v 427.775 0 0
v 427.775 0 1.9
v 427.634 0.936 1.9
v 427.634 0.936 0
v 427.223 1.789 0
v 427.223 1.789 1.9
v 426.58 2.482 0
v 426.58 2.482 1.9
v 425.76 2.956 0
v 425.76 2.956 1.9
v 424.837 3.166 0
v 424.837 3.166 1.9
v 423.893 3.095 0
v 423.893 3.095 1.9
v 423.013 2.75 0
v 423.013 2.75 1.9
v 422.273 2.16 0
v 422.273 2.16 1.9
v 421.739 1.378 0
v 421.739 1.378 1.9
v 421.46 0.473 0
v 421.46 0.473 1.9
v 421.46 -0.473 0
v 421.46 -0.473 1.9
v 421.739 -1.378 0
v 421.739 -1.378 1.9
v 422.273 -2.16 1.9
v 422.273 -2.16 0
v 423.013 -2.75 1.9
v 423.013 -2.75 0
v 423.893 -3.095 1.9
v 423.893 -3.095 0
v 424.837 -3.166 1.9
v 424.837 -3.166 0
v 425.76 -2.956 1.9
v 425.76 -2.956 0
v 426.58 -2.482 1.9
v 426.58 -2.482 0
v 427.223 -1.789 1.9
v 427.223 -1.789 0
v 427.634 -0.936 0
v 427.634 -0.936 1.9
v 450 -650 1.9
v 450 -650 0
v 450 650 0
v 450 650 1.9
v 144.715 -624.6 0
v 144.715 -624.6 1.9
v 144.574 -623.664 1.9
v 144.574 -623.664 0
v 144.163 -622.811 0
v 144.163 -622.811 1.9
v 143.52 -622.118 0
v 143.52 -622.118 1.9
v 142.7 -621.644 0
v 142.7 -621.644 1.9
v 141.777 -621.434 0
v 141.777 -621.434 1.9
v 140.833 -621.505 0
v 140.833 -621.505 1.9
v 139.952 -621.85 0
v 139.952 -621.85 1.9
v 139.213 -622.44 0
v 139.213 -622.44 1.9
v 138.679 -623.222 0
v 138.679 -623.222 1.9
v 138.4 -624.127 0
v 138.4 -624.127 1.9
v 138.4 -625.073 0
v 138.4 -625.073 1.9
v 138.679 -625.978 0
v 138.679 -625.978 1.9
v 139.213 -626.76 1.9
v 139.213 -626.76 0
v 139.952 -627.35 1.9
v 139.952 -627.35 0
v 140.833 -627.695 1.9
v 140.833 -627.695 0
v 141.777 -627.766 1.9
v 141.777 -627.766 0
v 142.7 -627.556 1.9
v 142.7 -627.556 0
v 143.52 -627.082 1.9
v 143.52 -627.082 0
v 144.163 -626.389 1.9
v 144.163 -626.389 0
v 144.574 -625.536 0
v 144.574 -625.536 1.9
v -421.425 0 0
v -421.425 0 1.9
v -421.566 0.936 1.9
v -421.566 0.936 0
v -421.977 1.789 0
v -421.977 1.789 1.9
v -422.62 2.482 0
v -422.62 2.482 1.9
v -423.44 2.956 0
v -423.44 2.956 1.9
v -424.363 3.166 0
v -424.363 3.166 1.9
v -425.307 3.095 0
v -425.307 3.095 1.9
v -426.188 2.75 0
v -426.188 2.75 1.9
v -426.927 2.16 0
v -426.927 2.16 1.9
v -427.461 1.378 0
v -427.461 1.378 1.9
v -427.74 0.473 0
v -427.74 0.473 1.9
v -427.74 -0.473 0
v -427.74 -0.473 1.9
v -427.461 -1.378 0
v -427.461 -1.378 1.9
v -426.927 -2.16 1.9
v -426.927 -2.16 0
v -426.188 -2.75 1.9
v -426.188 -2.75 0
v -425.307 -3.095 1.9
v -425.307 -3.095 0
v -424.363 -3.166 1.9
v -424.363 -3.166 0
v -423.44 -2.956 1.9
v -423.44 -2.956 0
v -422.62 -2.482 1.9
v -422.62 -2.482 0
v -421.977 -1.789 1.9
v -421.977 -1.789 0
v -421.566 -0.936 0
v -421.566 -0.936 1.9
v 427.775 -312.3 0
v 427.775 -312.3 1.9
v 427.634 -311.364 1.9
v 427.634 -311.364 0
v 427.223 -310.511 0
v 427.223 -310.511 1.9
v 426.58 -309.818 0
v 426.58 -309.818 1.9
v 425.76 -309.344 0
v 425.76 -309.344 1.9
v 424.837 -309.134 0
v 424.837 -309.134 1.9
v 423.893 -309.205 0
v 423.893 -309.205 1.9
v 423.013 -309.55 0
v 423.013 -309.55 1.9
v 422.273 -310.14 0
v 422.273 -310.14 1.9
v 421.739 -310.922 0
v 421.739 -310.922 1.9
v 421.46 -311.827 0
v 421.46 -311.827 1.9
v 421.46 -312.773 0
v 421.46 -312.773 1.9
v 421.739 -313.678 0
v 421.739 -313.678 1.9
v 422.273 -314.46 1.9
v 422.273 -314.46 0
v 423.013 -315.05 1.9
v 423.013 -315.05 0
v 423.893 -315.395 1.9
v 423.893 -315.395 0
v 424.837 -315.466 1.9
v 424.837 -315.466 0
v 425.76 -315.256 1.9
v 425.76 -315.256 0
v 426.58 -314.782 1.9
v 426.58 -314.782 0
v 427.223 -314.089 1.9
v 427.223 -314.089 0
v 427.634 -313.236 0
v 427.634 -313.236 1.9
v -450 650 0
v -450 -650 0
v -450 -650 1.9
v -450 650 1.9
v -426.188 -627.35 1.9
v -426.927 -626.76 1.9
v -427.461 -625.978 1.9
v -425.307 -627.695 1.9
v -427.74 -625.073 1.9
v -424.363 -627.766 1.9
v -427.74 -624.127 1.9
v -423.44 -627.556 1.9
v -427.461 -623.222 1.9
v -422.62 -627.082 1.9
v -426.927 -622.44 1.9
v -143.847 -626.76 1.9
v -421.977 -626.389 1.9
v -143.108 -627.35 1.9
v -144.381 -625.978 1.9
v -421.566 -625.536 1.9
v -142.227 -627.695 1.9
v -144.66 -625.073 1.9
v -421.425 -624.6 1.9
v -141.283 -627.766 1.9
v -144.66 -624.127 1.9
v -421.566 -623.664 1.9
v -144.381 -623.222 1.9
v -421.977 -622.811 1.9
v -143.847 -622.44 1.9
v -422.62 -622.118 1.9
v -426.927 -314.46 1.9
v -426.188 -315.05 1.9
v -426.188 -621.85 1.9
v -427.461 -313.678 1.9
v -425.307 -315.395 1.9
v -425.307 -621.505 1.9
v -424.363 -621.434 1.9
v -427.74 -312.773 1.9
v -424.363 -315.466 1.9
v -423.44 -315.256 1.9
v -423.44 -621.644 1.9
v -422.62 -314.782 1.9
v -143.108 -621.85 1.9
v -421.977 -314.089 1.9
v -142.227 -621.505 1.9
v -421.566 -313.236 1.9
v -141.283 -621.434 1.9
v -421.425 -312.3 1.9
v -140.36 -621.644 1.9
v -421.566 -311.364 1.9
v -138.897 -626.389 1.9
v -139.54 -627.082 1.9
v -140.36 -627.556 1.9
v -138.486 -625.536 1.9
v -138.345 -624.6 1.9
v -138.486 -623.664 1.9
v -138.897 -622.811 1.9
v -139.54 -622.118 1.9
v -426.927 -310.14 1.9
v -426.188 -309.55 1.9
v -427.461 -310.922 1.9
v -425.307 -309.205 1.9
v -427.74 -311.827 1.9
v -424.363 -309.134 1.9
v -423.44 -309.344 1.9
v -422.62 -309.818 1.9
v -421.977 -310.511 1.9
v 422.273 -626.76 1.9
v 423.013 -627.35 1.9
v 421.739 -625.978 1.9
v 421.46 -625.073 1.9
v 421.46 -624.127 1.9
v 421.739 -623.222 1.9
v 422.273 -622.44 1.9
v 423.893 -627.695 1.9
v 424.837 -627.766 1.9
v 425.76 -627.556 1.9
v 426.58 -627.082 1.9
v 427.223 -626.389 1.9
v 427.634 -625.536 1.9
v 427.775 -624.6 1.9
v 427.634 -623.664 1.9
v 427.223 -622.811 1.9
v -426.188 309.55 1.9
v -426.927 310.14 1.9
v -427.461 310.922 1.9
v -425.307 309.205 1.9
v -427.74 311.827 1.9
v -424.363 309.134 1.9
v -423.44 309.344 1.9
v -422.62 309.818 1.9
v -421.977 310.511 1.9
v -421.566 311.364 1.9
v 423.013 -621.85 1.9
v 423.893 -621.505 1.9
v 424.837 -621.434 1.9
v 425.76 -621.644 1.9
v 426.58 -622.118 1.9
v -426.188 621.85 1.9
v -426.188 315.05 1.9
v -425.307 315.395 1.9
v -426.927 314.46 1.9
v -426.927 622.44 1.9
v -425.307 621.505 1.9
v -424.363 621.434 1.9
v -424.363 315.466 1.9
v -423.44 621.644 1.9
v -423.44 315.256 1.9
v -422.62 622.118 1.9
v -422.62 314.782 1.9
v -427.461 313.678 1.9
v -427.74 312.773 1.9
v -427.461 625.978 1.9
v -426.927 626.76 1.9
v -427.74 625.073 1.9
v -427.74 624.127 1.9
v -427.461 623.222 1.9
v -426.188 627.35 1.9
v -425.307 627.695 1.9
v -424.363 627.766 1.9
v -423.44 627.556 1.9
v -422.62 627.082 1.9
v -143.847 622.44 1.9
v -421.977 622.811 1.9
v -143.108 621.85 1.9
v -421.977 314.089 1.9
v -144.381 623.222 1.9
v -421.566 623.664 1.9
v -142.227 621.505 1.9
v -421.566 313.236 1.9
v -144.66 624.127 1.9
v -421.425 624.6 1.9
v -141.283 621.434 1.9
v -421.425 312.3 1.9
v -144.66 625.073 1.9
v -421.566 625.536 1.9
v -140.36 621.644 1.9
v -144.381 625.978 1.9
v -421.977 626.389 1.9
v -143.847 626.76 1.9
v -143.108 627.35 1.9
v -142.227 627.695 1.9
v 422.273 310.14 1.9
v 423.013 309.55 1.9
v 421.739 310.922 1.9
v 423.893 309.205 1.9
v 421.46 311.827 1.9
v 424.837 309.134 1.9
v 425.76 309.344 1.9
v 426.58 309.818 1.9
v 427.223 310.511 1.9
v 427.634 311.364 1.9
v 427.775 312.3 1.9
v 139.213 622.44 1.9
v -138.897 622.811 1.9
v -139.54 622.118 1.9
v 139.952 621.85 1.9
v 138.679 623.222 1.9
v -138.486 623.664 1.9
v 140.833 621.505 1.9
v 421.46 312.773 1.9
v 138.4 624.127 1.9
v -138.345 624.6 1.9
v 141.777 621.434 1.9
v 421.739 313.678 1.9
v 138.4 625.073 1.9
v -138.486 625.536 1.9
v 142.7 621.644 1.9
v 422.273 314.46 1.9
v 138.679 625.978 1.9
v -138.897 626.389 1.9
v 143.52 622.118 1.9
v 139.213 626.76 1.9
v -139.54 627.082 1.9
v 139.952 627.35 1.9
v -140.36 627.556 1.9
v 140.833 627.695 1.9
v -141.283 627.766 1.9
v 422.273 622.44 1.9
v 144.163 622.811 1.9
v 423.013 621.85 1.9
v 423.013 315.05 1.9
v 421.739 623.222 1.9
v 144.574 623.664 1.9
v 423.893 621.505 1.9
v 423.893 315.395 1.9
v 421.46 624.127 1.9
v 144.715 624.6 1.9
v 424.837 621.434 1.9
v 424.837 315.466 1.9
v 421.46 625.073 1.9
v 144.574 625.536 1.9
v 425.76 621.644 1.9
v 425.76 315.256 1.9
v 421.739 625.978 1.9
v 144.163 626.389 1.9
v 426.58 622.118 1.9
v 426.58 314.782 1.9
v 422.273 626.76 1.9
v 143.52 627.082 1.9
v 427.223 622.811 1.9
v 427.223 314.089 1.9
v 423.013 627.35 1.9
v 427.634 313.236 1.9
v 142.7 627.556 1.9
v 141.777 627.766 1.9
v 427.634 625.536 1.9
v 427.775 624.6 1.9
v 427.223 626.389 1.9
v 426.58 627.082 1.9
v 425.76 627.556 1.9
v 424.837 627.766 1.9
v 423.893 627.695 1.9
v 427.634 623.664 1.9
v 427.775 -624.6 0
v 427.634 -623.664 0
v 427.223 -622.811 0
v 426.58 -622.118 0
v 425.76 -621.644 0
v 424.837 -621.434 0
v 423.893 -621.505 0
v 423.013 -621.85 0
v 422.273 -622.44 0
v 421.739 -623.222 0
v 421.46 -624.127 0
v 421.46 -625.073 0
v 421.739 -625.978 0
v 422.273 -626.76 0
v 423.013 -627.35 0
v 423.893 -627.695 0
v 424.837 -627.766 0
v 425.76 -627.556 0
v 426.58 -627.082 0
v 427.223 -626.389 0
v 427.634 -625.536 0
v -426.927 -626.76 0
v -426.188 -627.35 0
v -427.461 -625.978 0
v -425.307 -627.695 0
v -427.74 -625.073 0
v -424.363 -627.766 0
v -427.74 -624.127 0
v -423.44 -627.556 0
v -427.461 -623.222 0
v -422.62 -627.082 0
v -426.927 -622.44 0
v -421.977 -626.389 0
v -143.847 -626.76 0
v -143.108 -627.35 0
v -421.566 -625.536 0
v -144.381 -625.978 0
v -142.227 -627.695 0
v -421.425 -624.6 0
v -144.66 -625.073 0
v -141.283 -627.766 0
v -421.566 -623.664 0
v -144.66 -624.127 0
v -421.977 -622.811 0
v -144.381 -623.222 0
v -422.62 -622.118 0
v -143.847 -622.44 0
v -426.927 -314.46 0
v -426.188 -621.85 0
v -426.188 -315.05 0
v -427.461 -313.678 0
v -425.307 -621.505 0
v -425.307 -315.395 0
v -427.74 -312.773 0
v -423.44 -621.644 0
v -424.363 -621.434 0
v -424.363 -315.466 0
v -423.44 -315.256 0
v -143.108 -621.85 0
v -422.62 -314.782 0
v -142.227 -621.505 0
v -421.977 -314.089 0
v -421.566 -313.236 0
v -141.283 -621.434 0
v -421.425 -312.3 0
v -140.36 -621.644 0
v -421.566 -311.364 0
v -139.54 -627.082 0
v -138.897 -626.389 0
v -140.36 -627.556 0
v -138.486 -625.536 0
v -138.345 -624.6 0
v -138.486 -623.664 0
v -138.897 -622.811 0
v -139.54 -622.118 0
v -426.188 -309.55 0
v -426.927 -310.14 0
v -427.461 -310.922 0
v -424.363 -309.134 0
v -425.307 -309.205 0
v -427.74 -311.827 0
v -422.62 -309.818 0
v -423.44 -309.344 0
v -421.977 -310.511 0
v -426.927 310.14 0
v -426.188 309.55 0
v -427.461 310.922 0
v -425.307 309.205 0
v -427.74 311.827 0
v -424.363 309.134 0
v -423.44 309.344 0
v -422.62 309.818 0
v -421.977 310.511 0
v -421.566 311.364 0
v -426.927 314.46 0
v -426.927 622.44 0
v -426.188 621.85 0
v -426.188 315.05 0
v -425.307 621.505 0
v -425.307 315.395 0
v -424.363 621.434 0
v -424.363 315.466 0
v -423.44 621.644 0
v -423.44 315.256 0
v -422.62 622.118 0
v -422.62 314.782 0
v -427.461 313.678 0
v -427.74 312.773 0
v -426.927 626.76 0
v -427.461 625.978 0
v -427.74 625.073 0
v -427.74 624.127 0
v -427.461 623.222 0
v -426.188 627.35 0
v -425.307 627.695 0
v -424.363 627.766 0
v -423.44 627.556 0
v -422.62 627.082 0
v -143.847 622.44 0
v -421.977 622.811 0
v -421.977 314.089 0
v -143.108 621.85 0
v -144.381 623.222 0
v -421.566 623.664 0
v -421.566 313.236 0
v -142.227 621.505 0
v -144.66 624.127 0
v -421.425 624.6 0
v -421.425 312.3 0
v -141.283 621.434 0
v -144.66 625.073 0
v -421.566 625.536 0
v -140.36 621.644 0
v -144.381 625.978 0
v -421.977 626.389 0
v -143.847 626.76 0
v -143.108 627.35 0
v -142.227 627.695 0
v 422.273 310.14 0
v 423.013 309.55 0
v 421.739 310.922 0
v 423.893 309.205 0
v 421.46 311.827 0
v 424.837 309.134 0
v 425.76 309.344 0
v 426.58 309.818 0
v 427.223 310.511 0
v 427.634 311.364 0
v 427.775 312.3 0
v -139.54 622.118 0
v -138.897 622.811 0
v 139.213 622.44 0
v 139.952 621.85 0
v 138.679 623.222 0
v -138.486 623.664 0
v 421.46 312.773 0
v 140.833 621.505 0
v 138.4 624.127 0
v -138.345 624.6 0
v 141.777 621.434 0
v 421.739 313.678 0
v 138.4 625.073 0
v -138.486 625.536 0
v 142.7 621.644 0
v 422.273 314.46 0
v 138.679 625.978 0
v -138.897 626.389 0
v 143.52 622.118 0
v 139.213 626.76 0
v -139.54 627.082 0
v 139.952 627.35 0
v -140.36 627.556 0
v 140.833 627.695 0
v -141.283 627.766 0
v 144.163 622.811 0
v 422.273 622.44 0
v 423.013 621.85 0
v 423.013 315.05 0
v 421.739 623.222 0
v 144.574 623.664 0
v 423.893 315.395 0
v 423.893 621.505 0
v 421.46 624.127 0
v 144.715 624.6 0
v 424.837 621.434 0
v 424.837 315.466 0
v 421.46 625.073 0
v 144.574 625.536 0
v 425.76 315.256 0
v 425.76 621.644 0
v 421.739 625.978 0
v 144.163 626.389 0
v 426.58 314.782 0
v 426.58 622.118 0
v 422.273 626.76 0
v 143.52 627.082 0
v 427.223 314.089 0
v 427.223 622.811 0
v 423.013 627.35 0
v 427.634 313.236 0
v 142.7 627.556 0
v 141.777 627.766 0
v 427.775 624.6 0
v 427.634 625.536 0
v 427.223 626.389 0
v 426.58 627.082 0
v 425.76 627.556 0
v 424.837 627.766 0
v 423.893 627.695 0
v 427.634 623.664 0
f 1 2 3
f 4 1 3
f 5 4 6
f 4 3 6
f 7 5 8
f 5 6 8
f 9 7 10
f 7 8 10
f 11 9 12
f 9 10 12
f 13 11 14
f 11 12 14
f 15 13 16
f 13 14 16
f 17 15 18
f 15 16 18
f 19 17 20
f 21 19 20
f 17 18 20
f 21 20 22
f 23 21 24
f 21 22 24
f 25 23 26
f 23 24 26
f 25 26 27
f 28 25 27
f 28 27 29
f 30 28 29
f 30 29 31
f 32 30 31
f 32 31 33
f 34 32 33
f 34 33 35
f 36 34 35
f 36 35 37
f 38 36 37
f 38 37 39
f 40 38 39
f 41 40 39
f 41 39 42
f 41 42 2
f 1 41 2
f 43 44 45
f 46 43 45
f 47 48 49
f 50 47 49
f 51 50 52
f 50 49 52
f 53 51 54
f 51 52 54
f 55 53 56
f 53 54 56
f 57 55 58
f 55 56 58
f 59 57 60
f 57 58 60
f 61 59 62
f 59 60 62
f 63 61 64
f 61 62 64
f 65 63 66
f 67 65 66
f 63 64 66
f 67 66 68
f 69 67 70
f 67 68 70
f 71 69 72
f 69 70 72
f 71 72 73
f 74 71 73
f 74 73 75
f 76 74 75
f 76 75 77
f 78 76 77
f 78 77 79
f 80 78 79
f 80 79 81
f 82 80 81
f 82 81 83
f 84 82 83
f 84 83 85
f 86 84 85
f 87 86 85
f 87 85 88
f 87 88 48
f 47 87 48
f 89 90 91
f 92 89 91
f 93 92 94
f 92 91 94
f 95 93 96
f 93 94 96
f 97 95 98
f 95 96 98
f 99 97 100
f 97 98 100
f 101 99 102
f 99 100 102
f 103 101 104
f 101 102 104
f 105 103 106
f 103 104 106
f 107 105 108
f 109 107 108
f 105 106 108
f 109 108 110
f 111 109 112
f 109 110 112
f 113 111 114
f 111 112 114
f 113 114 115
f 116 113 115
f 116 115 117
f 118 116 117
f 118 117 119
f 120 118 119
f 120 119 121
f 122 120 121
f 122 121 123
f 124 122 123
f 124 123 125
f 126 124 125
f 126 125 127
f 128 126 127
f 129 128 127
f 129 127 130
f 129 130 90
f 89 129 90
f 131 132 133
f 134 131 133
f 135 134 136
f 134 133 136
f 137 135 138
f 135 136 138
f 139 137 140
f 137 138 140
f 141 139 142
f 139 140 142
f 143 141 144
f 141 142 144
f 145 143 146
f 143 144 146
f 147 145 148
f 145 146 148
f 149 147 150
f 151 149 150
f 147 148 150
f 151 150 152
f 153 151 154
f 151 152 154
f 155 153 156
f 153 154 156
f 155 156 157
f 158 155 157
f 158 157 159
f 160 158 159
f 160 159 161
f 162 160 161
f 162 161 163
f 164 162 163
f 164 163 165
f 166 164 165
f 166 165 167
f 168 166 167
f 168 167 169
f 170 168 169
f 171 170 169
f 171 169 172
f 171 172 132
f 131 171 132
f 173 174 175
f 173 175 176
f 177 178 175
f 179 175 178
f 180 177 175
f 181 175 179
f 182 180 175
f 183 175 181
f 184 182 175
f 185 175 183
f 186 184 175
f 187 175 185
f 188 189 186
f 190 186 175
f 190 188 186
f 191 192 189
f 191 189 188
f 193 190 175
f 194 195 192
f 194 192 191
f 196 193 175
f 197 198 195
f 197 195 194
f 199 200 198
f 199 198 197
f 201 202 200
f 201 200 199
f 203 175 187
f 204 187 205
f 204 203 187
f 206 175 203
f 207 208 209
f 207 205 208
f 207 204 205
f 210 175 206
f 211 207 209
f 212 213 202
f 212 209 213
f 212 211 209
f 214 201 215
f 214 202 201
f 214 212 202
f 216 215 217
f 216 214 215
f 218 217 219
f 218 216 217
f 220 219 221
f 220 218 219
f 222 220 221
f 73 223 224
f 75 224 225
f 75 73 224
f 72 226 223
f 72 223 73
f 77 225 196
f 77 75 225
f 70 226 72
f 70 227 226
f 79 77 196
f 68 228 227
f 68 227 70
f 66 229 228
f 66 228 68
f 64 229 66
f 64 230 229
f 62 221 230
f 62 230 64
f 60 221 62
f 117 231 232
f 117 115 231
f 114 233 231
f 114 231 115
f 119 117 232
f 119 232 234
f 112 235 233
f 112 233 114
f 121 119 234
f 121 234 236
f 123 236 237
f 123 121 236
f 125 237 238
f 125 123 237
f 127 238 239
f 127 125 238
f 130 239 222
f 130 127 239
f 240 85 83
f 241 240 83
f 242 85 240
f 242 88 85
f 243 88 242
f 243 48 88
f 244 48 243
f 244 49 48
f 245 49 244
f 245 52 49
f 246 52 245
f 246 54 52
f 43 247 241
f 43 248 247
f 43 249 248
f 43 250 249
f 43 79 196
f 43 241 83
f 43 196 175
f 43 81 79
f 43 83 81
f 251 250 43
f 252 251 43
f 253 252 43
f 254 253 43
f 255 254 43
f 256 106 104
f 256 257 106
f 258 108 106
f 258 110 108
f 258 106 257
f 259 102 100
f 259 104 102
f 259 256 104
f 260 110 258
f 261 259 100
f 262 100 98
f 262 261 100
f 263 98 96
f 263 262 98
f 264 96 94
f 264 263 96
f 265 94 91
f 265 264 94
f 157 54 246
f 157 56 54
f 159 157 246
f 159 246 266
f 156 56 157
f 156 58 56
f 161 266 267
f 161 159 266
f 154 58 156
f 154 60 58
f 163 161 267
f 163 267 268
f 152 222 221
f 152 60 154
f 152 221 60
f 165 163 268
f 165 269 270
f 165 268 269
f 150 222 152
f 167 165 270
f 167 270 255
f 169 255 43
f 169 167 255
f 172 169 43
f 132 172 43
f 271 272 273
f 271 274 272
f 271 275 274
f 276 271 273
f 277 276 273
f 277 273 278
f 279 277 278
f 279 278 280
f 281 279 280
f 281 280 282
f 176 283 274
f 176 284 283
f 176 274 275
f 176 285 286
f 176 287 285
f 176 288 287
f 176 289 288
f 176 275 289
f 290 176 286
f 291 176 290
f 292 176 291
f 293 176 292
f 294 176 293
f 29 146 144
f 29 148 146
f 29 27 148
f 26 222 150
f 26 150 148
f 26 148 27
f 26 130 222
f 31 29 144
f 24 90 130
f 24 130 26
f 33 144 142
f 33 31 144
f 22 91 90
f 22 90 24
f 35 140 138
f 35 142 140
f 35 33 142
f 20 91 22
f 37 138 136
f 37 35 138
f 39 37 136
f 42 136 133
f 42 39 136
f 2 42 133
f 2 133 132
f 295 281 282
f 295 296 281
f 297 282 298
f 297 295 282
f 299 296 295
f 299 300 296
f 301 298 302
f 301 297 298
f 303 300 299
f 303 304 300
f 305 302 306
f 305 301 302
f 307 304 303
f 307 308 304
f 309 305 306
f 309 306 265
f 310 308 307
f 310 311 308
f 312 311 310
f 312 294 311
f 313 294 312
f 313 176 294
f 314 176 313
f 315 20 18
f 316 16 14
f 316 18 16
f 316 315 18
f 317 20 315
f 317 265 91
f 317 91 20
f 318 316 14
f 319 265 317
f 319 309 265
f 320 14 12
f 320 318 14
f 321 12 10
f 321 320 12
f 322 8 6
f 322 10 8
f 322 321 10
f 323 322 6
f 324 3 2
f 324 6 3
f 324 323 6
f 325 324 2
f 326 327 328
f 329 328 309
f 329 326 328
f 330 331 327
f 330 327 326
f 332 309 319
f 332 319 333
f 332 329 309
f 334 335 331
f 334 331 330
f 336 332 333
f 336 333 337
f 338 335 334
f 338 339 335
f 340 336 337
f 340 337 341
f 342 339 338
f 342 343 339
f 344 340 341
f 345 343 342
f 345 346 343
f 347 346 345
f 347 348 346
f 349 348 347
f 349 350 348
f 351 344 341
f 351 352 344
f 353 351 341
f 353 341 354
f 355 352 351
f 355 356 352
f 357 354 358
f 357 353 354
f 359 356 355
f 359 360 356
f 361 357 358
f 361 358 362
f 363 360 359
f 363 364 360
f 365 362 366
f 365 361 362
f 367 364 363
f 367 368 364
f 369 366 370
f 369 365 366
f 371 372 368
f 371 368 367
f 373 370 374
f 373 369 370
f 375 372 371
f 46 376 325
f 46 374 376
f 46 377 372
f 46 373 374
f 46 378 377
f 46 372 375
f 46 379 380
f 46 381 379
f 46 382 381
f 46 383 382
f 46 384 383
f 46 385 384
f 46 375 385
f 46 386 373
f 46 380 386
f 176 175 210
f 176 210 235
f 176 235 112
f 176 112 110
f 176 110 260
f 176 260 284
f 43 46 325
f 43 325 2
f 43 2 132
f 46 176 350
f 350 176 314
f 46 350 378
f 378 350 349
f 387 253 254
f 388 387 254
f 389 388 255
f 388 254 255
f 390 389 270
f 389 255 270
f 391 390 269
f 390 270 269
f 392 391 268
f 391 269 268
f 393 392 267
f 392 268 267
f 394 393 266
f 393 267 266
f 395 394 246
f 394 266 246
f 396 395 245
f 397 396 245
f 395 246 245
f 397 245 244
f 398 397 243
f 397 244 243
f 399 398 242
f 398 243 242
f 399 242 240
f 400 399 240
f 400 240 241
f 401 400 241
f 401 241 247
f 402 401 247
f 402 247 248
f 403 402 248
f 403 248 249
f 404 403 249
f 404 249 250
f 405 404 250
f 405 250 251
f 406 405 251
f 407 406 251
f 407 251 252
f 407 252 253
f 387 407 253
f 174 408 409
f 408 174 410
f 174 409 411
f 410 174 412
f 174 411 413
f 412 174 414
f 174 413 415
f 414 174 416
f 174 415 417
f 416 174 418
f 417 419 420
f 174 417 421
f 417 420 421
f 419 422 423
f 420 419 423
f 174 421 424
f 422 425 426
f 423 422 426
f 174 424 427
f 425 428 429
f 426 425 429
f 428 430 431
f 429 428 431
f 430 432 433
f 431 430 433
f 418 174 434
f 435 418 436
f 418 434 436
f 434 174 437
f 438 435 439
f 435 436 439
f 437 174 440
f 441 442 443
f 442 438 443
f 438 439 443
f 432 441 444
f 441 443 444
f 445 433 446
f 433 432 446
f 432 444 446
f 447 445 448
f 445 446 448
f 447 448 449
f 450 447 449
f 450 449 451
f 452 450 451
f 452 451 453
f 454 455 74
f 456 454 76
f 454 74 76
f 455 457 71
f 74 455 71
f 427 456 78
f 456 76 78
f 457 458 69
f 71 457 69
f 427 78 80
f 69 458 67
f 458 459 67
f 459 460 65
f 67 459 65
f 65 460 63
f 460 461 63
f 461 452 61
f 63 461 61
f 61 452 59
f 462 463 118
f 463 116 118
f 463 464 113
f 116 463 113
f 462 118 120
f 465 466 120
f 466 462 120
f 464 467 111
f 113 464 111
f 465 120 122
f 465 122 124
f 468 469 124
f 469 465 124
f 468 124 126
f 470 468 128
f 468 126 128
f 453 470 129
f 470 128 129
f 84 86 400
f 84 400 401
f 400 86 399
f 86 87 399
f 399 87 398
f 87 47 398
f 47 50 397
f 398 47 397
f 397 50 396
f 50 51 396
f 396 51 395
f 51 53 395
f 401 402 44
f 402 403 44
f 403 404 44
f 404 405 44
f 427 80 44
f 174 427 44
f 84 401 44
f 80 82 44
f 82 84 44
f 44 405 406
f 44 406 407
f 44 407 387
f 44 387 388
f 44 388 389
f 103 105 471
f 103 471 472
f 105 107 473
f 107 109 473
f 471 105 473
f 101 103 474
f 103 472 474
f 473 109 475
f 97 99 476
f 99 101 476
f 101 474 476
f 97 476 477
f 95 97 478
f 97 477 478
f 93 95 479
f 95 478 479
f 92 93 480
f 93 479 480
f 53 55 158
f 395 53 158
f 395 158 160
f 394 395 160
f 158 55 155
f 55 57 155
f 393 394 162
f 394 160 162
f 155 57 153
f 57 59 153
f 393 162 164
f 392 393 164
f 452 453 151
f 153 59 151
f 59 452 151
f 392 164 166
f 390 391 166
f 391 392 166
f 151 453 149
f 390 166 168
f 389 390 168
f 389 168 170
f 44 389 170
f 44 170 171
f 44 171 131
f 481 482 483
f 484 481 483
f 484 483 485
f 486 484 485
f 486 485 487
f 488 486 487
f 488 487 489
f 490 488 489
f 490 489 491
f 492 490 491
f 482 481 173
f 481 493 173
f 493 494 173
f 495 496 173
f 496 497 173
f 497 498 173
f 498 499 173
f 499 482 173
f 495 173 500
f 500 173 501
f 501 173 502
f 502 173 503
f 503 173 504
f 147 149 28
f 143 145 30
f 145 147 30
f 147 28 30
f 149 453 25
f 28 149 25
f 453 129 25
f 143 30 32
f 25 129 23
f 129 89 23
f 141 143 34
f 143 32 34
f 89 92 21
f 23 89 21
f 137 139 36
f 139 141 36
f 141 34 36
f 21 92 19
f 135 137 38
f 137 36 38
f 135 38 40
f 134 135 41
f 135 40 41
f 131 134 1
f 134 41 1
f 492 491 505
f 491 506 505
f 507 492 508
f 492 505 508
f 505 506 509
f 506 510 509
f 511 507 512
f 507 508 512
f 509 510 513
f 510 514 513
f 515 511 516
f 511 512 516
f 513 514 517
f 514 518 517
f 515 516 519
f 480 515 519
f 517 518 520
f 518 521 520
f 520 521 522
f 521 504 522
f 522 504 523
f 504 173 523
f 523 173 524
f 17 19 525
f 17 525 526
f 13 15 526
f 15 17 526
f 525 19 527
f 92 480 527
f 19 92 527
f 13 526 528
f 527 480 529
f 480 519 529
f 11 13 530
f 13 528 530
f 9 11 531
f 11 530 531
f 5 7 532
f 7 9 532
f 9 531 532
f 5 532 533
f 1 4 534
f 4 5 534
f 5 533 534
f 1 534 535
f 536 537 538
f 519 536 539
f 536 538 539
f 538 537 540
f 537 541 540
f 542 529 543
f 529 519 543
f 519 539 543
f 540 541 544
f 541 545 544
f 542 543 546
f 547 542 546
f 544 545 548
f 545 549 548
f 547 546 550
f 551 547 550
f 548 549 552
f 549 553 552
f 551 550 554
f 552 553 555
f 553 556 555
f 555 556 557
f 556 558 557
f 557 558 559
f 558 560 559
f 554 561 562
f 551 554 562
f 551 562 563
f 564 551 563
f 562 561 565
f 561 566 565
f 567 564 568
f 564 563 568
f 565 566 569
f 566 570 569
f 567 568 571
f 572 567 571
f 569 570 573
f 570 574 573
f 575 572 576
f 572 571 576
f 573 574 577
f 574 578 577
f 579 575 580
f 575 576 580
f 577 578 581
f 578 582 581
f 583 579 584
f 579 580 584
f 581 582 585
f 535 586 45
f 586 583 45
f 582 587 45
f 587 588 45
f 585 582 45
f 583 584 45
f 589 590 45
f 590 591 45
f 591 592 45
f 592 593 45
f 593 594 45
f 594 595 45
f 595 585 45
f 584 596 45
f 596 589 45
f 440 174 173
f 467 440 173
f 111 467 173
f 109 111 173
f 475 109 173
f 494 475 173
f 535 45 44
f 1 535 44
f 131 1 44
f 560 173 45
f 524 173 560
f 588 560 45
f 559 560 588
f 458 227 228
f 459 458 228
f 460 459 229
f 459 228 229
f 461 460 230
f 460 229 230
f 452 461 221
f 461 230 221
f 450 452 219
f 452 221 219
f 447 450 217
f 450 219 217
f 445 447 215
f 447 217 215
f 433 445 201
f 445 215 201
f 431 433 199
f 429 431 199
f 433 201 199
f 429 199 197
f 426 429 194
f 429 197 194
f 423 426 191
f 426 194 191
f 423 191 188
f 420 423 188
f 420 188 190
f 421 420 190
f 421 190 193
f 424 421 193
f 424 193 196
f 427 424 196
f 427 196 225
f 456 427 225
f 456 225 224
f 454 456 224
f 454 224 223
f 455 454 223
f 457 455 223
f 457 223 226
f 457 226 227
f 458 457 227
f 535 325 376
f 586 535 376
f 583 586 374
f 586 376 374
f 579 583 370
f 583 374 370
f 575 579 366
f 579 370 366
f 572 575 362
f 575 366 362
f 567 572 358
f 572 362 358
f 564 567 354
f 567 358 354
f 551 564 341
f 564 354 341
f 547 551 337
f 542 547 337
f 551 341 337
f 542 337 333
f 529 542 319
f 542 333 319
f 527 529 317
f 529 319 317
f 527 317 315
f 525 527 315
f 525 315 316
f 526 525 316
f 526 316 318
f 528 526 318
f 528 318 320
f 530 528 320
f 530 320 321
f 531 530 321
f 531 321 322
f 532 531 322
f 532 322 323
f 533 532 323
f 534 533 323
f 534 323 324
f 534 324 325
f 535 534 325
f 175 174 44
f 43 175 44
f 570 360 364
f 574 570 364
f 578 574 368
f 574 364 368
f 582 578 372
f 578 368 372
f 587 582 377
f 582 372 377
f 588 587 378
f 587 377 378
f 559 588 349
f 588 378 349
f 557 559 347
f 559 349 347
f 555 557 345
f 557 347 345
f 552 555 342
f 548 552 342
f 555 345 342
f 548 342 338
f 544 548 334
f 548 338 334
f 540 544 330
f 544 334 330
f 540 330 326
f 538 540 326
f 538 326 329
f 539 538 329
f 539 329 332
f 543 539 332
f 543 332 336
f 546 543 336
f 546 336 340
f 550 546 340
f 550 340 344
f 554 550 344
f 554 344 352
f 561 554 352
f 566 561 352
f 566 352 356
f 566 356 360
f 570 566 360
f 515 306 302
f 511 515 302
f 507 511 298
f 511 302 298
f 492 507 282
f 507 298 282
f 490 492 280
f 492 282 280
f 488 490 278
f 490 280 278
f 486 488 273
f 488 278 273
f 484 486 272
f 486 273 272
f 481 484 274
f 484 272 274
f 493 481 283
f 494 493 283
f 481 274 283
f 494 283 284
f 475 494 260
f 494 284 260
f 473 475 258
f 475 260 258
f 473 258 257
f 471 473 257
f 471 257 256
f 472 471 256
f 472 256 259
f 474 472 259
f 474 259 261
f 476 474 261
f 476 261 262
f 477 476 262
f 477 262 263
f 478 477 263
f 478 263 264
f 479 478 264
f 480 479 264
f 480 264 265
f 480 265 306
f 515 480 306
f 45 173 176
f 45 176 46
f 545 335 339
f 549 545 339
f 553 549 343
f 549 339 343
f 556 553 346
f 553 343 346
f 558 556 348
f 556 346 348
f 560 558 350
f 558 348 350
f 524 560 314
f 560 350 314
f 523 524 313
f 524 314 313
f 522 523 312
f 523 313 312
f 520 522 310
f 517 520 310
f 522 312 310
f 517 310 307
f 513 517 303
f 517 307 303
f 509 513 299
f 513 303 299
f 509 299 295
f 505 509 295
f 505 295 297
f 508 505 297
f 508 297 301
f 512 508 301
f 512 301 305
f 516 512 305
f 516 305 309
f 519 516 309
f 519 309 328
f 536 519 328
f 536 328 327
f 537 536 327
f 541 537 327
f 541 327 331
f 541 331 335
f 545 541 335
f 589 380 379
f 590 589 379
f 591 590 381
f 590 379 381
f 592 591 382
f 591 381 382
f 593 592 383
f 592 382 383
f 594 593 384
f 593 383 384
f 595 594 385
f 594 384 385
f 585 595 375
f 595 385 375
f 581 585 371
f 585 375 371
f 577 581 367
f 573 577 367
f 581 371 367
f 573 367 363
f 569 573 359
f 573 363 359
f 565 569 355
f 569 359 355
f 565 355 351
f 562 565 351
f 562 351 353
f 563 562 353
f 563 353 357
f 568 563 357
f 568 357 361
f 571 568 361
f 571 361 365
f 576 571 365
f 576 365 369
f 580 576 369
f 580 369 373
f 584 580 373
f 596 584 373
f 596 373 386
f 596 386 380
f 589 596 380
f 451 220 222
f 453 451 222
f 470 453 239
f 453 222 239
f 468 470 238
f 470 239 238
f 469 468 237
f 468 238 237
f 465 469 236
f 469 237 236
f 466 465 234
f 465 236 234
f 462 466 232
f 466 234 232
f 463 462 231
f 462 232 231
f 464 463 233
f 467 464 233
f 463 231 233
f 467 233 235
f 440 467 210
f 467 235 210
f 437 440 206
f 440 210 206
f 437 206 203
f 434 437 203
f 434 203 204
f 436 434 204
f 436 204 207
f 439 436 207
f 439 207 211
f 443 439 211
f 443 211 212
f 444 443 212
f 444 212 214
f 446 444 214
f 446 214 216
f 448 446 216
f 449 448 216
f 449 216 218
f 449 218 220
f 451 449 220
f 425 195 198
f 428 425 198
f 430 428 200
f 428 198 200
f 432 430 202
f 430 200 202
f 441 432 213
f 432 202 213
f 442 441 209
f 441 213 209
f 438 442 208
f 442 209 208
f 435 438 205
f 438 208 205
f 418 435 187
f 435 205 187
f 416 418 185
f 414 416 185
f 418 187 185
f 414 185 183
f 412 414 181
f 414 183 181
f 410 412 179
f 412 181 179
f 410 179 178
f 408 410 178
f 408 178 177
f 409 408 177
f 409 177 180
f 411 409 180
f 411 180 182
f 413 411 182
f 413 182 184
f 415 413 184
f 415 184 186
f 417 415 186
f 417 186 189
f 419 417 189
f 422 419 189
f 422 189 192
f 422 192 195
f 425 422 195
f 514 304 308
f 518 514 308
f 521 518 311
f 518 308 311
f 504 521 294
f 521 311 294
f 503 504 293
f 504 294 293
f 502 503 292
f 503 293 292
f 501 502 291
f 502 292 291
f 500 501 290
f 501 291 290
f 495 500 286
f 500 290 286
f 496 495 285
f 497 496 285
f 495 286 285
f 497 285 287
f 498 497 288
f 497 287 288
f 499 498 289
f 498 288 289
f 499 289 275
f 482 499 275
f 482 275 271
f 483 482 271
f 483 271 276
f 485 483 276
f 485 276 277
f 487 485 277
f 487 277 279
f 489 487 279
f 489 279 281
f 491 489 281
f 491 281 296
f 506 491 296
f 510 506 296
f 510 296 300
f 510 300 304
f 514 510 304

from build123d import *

# Parameters (mm, degrees)
CROQUIS1_W              = 900
CROQUIS1_H              = 1300
SALIENTE_EXTRUIR1_DEPTH = 1.9
CROQUIS2_R              = 3.175
CORTAR_EXTRUIR1_DEPTH   = 10


with BuildPart() as part:
    # Croquis1 → Saliente-Extruir1 (new body)
    with BuildSketch(Plane.XY):
        Rectangle(CROQUIS1_W, CROQUIS1_H)
    extrude(amount=SALIENTE_EXTRUIR1_DEPTH)

    # Croquis2 → Cortar-Extruir1 (cut)
    with BuildSketch(Plane.XY.offset(1.9)):
        with Locations((424.6, 624.6)):
            Circle(CROQUIS2_R)
        with Locations((424.6, -624.6)):
            Circle(CROQUIS2_R)
        with Locations((-424.6, -624.6)):
            Circle(CROQUIS2_R)
        with Locations((-424.6, 624.6)):
            Circle(CROQUIS2_R)
        with Locations((141.54, 624.6)):
            Circle(CROQUIS2_R)
        with Locations((-141.52, 624.6)):
            Circle(CROQUIS2_R)
        with Locations((-141.52, -624.6)):
            Circle(CROQUIS2_R)
        with Locations((141.54, -624.6)):
            Circle(CROQUIS2_R)
        with Locations((424.6, 0)):
            Circle(CROQUIS2_R)
        with Locations((424.6, 312.3)):
            Circle(CROQUIS2_R)
        with Locations((424.6, -312.3)):
            Circle(CROQUIS2_R)
        with Locations((-424.6, -312.3)):
            Circle(CROQUIS2_R)
        with Locations((-424.6, 0)):
            Circle(CROQUIS2_R)
        with Locations((-424.6, 312.3)):
            Circle(CROQUIS2_R)
    extrude(amount=-CORTAR_EXTRUIR1_DEPTH, mode=Mode.SUBTRACT)


solid = part.part
